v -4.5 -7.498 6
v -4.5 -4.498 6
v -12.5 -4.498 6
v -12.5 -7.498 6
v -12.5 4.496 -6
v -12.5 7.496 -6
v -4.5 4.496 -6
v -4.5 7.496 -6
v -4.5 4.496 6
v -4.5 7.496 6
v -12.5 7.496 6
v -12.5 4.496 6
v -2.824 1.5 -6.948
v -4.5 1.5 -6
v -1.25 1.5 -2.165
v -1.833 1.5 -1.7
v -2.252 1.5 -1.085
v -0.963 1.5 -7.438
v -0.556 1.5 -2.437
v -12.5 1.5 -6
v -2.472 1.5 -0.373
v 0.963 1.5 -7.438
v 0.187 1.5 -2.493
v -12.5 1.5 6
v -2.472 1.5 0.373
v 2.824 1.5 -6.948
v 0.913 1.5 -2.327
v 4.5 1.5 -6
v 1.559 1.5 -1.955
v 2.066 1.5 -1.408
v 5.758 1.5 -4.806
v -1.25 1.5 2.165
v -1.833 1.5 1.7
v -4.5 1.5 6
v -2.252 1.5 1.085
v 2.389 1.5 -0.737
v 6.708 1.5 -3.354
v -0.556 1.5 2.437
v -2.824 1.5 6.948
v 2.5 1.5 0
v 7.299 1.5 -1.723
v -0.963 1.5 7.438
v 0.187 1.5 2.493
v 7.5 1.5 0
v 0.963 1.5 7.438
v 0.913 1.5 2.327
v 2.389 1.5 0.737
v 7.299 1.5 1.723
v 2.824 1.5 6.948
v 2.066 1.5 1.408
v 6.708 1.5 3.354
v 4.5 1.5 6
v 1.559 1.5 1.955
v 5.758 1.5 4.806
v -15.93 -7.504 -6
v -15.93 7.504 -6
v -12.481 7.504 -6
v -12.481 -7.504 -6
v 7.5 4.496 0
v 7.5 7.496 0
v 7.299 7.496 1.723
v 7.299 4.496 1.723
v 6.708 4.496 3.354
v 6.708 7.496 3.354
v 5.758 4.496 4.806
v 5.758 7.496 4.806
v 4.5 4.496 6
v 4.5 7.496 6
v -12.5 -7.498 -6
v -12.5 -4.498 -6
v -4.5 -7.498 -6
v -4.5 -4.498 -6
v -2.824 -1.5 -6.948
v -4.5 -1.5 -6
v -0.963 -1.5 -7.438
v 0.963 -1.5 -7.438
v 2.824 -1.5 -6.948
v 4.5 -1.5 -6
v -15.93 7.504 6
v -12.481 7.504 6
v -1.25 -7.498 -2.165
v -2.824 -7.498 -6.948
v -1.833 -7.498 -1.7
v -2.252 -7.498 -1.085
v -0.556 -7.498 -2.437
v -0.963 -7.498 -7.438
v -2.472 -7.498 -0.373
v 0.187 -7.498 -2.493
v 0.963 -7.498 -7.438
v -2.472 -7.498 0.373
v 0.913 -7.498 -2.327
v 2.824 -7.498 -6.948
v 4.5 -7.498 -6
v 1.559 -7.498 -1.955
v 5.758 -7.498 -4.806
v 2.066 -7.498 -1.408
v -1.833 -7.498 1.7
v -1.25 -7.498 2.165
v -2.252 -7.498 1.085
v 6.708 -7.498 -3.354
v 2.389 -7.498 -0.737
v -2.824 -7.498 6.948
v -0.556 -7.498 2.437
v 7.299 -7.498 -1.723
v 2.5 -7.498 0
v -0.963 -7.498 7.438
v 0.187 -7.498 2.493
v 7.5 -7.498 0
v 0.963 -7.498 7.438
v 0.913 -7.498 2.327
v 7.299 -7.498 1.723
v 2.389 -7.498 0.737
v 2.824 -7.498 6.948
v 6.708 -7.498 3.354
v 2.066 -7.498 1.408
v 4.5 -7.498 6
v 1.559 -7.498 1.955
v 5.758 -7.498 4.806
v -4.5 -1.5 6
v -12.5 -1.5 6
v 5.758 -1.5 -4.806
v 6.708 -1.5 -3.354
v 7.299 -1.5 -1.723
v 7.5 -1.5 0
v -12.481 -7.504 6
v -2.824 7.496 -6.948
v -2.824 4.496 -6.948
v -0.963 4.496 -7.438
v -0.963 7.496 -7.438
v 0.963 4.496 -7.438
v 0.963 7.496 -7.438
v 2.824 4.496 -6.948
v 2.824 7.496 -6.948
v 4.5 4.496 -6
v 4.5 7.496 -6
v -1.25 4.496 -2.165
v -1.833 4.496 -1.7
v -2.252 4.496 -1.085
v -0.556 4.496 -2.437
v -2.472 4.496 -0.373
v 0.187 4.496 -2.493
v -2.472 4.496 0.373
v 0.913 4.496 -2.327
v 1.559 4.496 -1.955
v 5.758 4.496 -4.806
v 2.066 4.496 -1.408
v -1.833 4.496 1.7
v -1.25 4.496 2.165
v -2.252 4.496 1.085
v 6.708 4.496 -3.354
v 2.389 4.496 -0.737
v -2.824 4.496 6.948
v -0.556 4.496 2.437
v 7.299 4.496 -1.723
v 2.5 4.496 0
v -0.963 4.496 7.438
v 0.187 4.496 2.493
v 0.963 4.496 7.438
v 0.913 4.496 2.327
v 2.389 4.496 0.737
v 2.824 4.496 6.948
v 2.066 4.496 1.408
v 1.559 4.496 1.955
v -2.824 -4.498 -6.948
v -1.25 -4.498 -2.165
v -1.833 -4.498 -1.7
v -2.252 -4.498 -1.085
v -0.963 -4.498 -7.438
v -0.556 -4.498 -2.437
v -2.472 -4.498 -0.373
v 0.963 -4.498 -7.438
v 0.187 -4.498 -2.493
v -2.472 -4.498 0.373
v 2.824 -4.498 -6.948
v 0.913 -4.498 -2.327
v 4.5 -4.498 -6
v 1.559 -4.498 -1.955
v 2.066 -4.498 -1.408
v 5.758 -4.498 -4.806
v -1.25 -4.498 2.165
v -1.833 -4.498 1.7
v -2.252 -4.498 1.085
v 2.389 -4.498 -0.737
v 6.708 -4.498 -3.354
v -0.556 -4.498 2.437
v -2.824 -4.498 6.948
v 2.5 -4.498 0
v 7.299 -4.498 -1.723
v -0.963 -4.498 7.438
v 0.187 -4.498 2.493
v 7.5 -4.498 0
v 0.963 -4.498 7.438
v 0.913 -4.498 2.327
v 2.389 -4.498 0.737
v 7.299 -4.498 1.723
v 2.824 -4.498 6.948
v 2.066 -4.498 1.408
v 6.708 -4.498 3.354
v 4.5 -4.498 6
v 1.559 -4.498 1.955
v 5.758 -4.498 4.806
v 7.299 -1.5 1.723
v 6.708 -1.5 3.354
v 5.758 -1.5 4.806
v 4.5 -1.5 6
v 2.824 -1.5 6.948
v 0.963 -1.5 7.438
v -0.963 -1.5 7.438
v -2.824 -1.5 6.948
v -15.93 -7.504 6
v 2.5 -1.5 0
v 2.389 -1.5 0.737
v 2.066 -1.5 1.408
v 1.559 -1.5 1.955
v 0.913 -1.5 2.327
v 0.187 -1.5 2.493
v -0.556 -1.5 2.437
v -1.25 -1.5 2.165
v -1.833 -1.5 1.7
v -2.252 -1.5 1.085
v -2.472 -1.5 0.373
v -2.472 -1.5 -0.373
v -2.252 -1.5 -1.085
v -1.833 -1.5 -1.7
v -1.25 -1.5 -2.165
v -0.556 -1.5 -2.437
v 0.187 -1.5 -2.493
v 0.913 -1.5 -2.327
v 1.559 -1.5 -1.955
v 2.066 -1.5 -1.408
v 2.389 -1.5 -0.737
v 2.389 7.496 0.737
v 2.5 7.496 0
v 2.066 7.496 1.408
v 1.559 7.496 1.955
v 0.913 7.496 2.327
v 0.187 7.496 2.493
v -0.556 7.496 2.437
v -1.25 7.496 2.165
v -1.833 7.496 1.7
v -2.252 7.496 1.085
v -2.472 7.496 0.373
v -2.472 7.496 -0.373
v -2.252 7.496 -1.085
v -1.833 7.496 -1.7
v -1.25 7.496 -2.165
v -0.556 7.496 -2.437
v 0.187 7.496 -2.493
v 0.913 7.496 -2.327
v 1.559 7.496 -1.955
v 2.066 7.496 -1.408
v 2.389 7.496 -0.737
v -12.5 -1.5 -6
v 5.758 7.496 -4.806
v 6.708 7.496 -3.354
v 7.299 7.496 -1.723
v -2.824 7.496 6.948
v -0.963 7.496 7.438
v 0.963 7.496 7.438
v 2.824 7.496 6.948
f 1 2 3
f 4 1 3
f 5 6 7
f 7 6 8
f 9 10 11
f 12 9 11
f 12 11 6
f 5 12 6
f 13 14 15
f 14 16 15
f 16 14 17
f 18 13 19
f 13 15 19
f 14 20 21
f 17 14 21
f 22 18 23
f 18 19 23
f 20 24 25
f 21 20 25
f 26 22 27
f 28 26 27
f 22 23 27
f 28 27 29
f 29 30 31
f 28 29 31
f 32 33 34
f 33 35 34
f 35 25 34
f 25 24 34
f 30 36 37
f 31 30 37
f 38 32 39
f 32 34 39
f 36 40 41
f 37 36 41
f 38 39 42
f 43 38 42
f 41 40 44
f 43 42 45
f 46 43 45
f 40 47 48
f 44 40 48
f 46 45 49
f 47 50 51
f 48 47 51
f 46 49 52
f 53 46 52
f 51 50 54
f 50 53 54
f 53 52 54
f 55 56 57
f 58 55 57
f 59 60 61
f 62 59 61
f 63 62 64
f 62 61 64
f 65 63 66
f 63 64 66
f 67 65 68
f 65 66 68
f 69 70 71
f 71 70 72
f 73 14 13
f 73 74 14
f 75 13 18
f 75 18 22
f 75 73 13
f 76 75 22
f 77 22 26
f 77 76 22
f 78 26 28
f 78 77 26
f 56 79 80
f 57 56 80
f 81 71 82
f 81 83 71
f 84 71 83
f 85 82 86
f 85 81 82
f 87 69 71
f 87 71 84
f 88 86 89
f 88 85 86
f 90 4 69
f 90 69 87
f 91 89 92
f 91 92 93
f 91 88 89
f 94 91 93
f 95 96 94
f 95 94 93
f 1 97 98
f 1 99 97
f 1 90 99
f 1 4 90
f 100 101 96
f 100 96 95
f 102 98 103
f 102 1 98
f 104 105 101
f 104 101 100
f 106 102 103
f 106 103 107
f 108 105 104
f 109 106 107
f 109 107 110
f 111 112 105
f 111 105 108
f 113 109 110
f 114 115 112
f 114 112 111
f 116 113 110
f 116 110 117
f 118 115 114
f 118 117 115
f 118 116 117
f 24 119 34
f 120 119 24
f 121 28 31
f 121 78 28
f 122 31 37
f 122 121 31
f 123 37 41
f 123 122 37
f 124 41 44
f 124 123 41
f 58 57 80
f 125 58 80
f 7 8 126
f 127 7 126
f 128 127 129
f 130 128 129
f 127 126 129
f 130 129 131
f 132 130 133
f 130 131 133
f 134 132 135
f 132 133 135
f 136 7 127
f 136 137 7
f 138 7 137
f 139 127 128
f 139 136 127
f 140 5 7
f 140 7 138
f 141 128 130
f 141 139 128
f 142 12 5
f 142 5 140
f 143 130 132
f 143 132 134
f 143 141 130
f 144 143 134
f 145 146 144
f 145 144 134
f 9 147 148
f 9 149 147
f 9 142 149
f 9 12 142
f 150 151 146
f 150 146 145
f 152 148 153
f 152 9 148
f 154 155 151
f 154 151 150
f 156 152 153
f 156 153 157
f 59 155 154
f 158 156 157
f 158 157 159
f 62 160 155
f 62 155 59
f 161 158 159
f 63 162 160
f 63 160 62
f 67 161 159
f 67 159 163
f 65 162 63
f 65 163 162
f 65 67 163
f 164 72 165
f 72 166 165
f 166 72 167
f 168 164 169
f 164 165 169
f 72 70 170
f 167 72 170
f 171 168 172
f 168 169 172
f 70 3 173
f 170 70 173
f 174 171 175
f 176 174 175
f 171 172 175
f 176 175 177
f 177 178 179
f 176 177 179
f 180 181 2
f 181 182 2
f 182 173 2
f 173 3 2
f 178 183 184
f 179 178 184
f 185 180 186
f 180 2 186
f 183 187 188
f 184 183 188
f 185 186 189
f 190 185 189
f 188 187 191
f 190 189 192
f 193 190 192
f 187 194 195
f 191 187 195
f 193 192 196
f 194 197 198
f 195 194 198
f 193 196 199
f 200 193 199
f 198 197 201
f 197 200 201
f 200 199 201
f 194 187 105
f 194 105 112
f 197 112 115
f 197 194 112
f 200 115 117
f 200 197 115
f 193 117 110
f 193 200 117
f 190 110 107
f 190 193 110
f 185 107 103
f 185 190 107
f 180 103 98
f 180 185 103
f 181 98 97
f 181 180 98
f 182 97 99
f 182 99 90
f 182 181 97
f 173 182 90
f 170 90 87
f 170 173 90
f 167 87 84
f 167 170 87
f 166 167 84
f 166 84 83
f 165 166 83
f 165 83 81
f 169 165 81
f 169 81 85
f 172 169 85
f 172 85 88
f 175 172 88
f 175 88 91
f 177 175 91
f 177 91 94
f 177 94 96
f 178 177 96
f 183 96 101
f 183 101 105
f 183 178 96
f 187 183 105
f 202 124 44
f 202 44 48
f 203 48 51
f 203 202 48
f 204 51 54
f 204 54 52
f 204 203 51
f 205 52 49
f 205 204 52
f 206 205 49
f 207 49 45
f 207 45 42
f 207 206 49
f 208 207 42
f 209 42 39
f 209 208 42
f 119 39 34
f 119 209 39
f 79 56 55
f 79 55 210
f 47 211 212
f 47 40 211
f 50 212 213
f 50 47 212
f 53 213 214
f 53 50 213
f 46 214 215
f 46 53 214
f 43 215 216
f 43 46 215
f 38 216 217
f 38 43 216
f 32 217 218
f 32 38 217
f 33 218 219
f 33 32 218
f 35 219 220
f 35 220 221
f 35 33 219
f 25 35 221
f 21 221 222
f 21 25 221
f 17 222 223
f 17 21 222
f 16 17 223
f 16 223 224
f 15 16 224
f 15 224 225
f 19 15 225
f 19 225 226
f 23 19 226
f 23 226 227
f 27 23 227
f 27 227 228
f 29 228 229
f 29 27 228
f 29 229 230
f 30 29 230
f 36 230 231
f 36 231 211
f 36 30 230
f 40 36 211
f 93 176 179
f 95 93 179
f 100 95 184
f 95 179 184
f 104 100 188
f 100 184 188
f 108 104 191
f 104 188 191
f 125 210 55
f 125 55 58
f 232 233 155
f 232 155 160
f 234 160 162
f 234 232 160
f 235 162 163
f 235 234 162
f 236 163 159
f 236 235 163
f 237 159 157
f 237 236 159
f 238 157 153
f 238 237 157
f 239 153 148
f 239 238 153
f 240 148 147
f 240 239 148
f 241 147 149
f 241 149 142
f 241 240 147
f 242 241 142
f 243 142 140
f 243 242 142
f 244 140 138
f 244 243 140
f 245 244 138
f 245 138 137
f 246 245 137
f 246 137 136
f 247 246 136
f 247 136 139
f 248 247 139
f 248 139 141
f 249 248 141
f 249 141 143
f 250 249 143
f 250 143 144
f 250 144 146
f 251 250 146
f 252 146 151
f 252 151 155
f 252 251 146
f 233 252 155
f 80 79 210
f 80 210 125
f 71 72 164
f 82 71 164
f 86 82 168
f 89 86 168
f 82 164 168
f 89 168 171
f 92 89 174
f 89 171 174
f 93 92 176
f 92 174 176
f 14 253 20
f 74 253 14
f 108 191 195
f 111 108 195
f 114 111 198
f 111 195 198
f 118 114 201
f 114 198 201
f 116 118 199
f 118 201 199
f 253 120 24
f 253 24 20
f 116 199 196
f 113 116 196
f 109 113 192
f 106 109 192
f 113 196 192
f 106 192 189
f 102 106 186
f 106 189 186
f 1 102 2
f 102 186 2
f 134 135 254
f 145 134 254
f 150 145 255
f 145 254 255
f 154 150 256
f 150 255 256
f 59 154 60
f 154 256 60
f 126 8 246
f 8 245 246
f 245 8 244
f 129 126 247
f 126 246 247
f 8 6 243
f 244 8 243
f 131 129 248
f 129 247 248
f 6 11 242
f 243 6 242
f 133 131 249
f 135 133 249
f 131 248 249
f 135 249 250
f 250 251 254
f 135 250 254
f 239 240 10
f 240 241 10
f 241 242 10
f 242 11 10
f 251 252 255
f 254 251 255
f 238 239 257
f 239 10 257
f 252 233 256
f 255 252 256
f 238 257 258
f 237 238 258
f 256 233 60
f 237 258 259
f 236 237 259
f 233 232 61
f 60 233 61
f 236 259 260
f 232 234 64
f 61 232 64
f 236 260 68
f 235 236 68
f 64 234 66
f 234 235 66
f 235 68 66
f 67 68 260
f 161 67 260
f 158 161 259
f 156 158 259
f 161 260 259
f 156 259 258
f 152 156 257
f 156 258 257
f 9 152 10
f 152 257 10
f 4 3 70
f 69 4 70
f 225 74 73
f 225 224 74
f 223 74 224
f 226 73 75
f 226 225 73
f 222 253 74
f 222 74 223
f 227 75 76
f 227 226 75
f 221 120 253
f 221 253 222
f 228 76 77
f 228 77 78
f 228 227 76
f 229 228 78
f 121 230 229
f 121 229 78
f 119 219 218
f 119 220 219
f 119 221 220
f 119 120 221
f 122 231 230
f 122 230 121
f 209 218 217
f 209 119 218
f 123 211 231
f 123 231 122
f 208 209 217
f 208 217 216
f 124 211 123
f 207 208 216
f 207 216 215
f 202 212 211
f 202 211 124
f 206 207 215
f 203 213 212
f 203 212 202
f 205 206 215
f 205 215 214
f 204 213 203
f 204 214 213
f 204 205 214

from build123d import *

# Parameters (mm, degrees)
F0_W      = 8.9999904667
F0_H      = 12.0000014
F0_R      = 2.499995
F1_DEPTH  = 1.499997
F2_DEPTH  = 2.999994
F4_DEPTH  = 2.999994
F6_DEPTH  = 2.999994
F8_DEPTH  = 2.999994
F10_W     = 3.4485142678
F10_H     = 12.0000014
F11_DEPTH = 7.504303


with BuildPart() as f1:
    # F0 (on Front) → F1 (new body, symmetric)
    with BuildSketch(Plane.XZ):
        with BuildLine():
            ThreePointArc((4.4999952333, -6.0000007), (6.7082009287, -3.3541028309), (7.4999977, 0))
            ThreePointArc((7.4999977, 0), (6.7082009287, 3.3541028309), (4.4999952333, 6.0000007))
            Line((4.4999952333, 6.0000007), (4.4999952333, -6.0000007))
        make_face()
        with BuildLine():
            Line((-4.4999952333, 6.0000007), (4.4999952333, 6.0000007))
            ThreePointArc((4.4999952333, 6.0000007), (0, 7.4999977), (-4.4999952333, 6.0000007))
        make_face()
        Rectangle(F0_W, F0_H)
        Circle(F0_R, mode=Mode.SUBTRACT)
        with BuildLine():
            ThreePointArc((-4.4999952333, -6.0000007), (0, -7.4999977), (4.4999952333, -6.0000007))
            Line((4.4999952333, -6.0000007), (-4.4999952333, -6.0000007))
        make_face()
        with BuildLine():
            Line((-4.4999952333, -6.0000007), (-4.4999952333, 6.0000007))
            ThreePointArc((-4.4999952333, 6.0000007), (-7.4999977, 0), (-4.4999952333, -6.0000007))
        make_face()
        with BuildLine():
            ThreePointArc((-4.4999952333, -6.0000007), (-7.4999977, 0), (-4.4999952333, 6.0000007))
            Line((-4.4999952333, 6.0000007), (-12.4999961667, 6.0000007))
            Line((-12.4999961667, 6.0000007), (-12.4999961667, -6.0000007))
            Line((-12.4999961667, -6.0000007), (-4.4999952333, -6.0000007))
        make_face()
    extrude(amount=F1_DEPTH, both=True)


with BuildPart() as f2:
    # F0 (on Front) → F2 (new body)
    with BuildSketch(Plane.XZ):
        with BuildLine():
            ThreePointArc((4.4999952333, -6.0000007), (6.7082009287, -3.3541028309), (7.4999977, 0))
            ThreePointArc((7.4999977, 0), (6.7082009287, 3.3541028309), (4.4999952333, 6.0000007))
            Line((4.4999952333, 6.0000007), (4.4999952333, -6.0000007))
        make_face()
        with BuildLine():
            Line((-4.4999952333, 6.0000007), (4.4999952333, 6.0000007))
            ThreePointArc((4.4999952333, 6.0000007), (0, 7.4999977), (-4.4999952333, 6.0000007))
        make_face()
        Rectangle(F0_W, F0_H)
        Circle(F0_R, mode=Mode.SUBTRACT)
        with BuildLine():
            ThreePointArc((-4.4999952333, -6.0000007), (0, -7.4999977), (4.4999952333, -6.0000007))
            Line((4.4999952333, -6.0000007), (-4.4999952333, -6.0000007))
        make_face()
        with BuildLine():
            Line((-4.4999952333, -6.0000007), (-4.4999952333, 6.0000007))
            ThreePointArc((-4.4999952333, 6.0000007), (-7.4999977, 0), (-4.4999952333, -6.0000007))
        make_face()
        with BuildLine():
            ThreePointArc((-4.4999952333, -6.0000007), (-7.4999977, 0), (-4.4999952333, 6.0000007))
            Line((-4.4999952333, 6.0000007), (-12.4999961667, 6.0000007))
            Line((-12.4999961667, 6.0000007), (-12.4999961667, -6.0000007))
            Line((-12.4999961667, -6.0000007), (-4.4999952333, -6.0000007))
        make_face()
    extrude(amount=-F2_DEPTH)


with BuildPart() as f2_1:
    # F3: moved
    add(f2.part.moved(Location((0, 1.4986, 0))))


with BuildPart() as f4:
    # F0 (on Front) → F4 (new body)
    with BuildSketch(Plane.XZ):
        with BuildLine():
            ThreePointArc((4.4999952333, -6.0000007), (6.7082009287, -3.3541028309), (7.4999977, 0))
            ThreePointArc((7.4999977, 0), (6.7082009287, 3.3541028309), (4.4999952333, 6.0000007))
            Line((4.4999952333, 6.0000007), (4.4999952333, -6.0000007))
        make_face()
        with BuildLine():
            Line((-4.4999952333, 6.0000007), (4.4999952333, 6.0000007))
            ThreePointArc((4.4999952333, 6.0000007), (0, 7.4999977), (-4.4999952333, 6.0000007))
        make_face()
        Rectangle(F0_W, F0_H)
        Circle(F0_R, mode=Mode.SUBTRACT)
        with BuildLine():
            ThreePointArc((-4.4999952333, -6.0000007), (0, -7.4999977), (4.4999952333, -6.0000007))
            Line((4.4999952333, -6.0000007), (-4.4999952333, -6.0000007))
        make_face()
        with BuildLine():
            Line((-4.4999952333, -6.0000007), (-4.4999952333, 6.0000007))
            ThreePointArc((-4.4999952333, 6.0000007), (-7.4999977, 0), (-4.4999952333, -6.0000007))
        make_face()
        with BuildLine():
            ThreePointArc((-4.4999952333, -6.0000007), (-7.4999977, 0), (-4.4999952333, 6.0000007))
            Line((-4.4999952333, 6.0000007), (-12.4999961667, 6.0000007))
            Line((-12.4999961667, 6.0000007), (-12.4999961667, -6.0000007))
            Line((-12.4999961667, -6.0000007), (-4.4999952333, -6.0000007))
        make_face()
    extrude(amount=F4_DEPTH)


with BuildPart() as f4_1:
    # F5: moved
    add(f4.part.moved(Location((0, -1.500124, 0))))


with BuildPart() as f6:
    # F0 (on Front) → F6 (new body)
    with BuildSketch(Plane.XZ):
        with BuildLine():
            ThreePointArc((4.4999952333, -6.0000007), (6.7082009287, -3.3541028309), (7.4999977, 0))
            ThreePointArc((7.4999977, 0), (6.7082009287, 3.3541028309), (4.4999952333, 6.0000007))
            Line((4.4999952333, 6.0000007), (4.4999952333, -6.0000007))
        make_face()
        with BuildLine():
            Line((-4.4999952333, 6.0000007), (4.4999952333, 6.0000007))
            ThreePointArc((4.4999952333, 6.0000007), (0, 7.4999977), (-4.4999952333, 6.0000007))
        make_face()
        Rectangle(F0_W, F0_H)
        Circle(F0_R, mode=Mode.SUBTRACT)
        with BuildLine():
            ThreePointArc((-4.4999952333, -6.0000007), (0, -7.4999977), (4.4999952333, -6.0000007))
            Line((4.4999952333, -6.0000007), (-4.4999952333, -6.0000007))
        make_face()
        with BuildLine():
            Line((-4.4999952333, -6.0000007), (-4.4999952333, 6.0000007))
            ThreePointArc((-4.4999952333, 6.0000007), (-7.4999977, 0), (-4.4999952333, -6.0000007))
        make_face()
        with BuildLine():
            ThreePointArc((-4.4999952333, -6.0000007), (-7.4999977, 0), (-4.4999952333, 6.0000007))
            Line((-4.4999952333, 6.0000007), (-12.4999961667, 6.0000007))
            Line((-12.4999961667, 6.0000007), (-12.4999961667, -6.0000007))
            Line((-12.4999961667, -6.0000007), (-4.4999952333, -6.0000007))
        make_face()
    extrude(amount=F6_DEPTH)


with BuildPart() as f6_1:
    # F7: moved
    add(f6.part.moved(Location((0, -4.49834, 0))))


with BuildPart() as f8:
    # F0 (on Front) → F8 (new body)
    with BuildSketch(Plane.XZ):
        with BuildLine():
            ThreePointArc((4.4999952333, -6.0000007), (6.7082009287, -3.3541028309), (7.4999977, 0))
            ThreePointArc((7.4999977, 0), (6.7082009287, 3.3541028309), (4.4999952333, 6.0000007))
            Line((4.4999952333, 6.0000007), (4.4999952333, -6.0000007))
        make_face()
        with BuildLine():
            Line((-4.4999952333, 6.0000007), (4.4999952333, 6.0000007))
            ThreePointArc((4.4999952333, 6.0000007), (0, 7.4999977), (-4.4999952333, 6.0000007))
        make_face()
        Rectangle(F0_W, F0_H)
        Circle(F0_R, mode=Mode.SUBTRACT)
        with BuildLine():
            ThreePointArc((-4.4999952333, -6.0000007), (0, -7.4999977), (4.4999952333, -6.0000007))
            Line((4.4999952333, -6.0000007), (-4.4999952333, -6.0000007))
        make_face()
        with BuildLine():
            Line((-4.4999952333, -6.0000007), (-4.4999952333, 6.0000007))
            ThreePointArc((-4.4999952333, 6.0000007), (-7.4999977, 0), (-4.4999952333, -6.0000007))
        make_face()
        with BuildLine():
            ThreePointArc((-4.4999952333, -6.0000007), (-7.4999977, 0), (-4.4999952333, 6.0000007))
            Line((-4.4999952333, 6.0000007), (-12.4999961667, 6.0000007))
            Line((-12.4999961667, 6.0000007), (-12.4999961667, -6.0000007))
            Line((-12.4999961667, -6.0000007), (-4.4999952333, -6.0000007))
        make_face()
    extrude(amount=F8_DEPTH)


with BuildPart() as f8_1:
    # F9: moved
    add(f8.part.moved(Location((0, 7.49554, 0))))


with BuildPart() as f11:
    # F10 (on Front) → F11 (new body, symmetric)
    with BuildSketch(Plane.XZ):
        with Locations((-14.2310289666, 0)):
            Rectangle(F10_W, F10_H)
    extrude(amount=F11_DEPTH, both=True)


with BuildPart() as f11_1:
    # F12: moved
    add(f11.part.moved(Location((0.0254, 0, 0))))


solid = Compound([f1.part, f6_1.part, f8_1.part, f11_1.part])
